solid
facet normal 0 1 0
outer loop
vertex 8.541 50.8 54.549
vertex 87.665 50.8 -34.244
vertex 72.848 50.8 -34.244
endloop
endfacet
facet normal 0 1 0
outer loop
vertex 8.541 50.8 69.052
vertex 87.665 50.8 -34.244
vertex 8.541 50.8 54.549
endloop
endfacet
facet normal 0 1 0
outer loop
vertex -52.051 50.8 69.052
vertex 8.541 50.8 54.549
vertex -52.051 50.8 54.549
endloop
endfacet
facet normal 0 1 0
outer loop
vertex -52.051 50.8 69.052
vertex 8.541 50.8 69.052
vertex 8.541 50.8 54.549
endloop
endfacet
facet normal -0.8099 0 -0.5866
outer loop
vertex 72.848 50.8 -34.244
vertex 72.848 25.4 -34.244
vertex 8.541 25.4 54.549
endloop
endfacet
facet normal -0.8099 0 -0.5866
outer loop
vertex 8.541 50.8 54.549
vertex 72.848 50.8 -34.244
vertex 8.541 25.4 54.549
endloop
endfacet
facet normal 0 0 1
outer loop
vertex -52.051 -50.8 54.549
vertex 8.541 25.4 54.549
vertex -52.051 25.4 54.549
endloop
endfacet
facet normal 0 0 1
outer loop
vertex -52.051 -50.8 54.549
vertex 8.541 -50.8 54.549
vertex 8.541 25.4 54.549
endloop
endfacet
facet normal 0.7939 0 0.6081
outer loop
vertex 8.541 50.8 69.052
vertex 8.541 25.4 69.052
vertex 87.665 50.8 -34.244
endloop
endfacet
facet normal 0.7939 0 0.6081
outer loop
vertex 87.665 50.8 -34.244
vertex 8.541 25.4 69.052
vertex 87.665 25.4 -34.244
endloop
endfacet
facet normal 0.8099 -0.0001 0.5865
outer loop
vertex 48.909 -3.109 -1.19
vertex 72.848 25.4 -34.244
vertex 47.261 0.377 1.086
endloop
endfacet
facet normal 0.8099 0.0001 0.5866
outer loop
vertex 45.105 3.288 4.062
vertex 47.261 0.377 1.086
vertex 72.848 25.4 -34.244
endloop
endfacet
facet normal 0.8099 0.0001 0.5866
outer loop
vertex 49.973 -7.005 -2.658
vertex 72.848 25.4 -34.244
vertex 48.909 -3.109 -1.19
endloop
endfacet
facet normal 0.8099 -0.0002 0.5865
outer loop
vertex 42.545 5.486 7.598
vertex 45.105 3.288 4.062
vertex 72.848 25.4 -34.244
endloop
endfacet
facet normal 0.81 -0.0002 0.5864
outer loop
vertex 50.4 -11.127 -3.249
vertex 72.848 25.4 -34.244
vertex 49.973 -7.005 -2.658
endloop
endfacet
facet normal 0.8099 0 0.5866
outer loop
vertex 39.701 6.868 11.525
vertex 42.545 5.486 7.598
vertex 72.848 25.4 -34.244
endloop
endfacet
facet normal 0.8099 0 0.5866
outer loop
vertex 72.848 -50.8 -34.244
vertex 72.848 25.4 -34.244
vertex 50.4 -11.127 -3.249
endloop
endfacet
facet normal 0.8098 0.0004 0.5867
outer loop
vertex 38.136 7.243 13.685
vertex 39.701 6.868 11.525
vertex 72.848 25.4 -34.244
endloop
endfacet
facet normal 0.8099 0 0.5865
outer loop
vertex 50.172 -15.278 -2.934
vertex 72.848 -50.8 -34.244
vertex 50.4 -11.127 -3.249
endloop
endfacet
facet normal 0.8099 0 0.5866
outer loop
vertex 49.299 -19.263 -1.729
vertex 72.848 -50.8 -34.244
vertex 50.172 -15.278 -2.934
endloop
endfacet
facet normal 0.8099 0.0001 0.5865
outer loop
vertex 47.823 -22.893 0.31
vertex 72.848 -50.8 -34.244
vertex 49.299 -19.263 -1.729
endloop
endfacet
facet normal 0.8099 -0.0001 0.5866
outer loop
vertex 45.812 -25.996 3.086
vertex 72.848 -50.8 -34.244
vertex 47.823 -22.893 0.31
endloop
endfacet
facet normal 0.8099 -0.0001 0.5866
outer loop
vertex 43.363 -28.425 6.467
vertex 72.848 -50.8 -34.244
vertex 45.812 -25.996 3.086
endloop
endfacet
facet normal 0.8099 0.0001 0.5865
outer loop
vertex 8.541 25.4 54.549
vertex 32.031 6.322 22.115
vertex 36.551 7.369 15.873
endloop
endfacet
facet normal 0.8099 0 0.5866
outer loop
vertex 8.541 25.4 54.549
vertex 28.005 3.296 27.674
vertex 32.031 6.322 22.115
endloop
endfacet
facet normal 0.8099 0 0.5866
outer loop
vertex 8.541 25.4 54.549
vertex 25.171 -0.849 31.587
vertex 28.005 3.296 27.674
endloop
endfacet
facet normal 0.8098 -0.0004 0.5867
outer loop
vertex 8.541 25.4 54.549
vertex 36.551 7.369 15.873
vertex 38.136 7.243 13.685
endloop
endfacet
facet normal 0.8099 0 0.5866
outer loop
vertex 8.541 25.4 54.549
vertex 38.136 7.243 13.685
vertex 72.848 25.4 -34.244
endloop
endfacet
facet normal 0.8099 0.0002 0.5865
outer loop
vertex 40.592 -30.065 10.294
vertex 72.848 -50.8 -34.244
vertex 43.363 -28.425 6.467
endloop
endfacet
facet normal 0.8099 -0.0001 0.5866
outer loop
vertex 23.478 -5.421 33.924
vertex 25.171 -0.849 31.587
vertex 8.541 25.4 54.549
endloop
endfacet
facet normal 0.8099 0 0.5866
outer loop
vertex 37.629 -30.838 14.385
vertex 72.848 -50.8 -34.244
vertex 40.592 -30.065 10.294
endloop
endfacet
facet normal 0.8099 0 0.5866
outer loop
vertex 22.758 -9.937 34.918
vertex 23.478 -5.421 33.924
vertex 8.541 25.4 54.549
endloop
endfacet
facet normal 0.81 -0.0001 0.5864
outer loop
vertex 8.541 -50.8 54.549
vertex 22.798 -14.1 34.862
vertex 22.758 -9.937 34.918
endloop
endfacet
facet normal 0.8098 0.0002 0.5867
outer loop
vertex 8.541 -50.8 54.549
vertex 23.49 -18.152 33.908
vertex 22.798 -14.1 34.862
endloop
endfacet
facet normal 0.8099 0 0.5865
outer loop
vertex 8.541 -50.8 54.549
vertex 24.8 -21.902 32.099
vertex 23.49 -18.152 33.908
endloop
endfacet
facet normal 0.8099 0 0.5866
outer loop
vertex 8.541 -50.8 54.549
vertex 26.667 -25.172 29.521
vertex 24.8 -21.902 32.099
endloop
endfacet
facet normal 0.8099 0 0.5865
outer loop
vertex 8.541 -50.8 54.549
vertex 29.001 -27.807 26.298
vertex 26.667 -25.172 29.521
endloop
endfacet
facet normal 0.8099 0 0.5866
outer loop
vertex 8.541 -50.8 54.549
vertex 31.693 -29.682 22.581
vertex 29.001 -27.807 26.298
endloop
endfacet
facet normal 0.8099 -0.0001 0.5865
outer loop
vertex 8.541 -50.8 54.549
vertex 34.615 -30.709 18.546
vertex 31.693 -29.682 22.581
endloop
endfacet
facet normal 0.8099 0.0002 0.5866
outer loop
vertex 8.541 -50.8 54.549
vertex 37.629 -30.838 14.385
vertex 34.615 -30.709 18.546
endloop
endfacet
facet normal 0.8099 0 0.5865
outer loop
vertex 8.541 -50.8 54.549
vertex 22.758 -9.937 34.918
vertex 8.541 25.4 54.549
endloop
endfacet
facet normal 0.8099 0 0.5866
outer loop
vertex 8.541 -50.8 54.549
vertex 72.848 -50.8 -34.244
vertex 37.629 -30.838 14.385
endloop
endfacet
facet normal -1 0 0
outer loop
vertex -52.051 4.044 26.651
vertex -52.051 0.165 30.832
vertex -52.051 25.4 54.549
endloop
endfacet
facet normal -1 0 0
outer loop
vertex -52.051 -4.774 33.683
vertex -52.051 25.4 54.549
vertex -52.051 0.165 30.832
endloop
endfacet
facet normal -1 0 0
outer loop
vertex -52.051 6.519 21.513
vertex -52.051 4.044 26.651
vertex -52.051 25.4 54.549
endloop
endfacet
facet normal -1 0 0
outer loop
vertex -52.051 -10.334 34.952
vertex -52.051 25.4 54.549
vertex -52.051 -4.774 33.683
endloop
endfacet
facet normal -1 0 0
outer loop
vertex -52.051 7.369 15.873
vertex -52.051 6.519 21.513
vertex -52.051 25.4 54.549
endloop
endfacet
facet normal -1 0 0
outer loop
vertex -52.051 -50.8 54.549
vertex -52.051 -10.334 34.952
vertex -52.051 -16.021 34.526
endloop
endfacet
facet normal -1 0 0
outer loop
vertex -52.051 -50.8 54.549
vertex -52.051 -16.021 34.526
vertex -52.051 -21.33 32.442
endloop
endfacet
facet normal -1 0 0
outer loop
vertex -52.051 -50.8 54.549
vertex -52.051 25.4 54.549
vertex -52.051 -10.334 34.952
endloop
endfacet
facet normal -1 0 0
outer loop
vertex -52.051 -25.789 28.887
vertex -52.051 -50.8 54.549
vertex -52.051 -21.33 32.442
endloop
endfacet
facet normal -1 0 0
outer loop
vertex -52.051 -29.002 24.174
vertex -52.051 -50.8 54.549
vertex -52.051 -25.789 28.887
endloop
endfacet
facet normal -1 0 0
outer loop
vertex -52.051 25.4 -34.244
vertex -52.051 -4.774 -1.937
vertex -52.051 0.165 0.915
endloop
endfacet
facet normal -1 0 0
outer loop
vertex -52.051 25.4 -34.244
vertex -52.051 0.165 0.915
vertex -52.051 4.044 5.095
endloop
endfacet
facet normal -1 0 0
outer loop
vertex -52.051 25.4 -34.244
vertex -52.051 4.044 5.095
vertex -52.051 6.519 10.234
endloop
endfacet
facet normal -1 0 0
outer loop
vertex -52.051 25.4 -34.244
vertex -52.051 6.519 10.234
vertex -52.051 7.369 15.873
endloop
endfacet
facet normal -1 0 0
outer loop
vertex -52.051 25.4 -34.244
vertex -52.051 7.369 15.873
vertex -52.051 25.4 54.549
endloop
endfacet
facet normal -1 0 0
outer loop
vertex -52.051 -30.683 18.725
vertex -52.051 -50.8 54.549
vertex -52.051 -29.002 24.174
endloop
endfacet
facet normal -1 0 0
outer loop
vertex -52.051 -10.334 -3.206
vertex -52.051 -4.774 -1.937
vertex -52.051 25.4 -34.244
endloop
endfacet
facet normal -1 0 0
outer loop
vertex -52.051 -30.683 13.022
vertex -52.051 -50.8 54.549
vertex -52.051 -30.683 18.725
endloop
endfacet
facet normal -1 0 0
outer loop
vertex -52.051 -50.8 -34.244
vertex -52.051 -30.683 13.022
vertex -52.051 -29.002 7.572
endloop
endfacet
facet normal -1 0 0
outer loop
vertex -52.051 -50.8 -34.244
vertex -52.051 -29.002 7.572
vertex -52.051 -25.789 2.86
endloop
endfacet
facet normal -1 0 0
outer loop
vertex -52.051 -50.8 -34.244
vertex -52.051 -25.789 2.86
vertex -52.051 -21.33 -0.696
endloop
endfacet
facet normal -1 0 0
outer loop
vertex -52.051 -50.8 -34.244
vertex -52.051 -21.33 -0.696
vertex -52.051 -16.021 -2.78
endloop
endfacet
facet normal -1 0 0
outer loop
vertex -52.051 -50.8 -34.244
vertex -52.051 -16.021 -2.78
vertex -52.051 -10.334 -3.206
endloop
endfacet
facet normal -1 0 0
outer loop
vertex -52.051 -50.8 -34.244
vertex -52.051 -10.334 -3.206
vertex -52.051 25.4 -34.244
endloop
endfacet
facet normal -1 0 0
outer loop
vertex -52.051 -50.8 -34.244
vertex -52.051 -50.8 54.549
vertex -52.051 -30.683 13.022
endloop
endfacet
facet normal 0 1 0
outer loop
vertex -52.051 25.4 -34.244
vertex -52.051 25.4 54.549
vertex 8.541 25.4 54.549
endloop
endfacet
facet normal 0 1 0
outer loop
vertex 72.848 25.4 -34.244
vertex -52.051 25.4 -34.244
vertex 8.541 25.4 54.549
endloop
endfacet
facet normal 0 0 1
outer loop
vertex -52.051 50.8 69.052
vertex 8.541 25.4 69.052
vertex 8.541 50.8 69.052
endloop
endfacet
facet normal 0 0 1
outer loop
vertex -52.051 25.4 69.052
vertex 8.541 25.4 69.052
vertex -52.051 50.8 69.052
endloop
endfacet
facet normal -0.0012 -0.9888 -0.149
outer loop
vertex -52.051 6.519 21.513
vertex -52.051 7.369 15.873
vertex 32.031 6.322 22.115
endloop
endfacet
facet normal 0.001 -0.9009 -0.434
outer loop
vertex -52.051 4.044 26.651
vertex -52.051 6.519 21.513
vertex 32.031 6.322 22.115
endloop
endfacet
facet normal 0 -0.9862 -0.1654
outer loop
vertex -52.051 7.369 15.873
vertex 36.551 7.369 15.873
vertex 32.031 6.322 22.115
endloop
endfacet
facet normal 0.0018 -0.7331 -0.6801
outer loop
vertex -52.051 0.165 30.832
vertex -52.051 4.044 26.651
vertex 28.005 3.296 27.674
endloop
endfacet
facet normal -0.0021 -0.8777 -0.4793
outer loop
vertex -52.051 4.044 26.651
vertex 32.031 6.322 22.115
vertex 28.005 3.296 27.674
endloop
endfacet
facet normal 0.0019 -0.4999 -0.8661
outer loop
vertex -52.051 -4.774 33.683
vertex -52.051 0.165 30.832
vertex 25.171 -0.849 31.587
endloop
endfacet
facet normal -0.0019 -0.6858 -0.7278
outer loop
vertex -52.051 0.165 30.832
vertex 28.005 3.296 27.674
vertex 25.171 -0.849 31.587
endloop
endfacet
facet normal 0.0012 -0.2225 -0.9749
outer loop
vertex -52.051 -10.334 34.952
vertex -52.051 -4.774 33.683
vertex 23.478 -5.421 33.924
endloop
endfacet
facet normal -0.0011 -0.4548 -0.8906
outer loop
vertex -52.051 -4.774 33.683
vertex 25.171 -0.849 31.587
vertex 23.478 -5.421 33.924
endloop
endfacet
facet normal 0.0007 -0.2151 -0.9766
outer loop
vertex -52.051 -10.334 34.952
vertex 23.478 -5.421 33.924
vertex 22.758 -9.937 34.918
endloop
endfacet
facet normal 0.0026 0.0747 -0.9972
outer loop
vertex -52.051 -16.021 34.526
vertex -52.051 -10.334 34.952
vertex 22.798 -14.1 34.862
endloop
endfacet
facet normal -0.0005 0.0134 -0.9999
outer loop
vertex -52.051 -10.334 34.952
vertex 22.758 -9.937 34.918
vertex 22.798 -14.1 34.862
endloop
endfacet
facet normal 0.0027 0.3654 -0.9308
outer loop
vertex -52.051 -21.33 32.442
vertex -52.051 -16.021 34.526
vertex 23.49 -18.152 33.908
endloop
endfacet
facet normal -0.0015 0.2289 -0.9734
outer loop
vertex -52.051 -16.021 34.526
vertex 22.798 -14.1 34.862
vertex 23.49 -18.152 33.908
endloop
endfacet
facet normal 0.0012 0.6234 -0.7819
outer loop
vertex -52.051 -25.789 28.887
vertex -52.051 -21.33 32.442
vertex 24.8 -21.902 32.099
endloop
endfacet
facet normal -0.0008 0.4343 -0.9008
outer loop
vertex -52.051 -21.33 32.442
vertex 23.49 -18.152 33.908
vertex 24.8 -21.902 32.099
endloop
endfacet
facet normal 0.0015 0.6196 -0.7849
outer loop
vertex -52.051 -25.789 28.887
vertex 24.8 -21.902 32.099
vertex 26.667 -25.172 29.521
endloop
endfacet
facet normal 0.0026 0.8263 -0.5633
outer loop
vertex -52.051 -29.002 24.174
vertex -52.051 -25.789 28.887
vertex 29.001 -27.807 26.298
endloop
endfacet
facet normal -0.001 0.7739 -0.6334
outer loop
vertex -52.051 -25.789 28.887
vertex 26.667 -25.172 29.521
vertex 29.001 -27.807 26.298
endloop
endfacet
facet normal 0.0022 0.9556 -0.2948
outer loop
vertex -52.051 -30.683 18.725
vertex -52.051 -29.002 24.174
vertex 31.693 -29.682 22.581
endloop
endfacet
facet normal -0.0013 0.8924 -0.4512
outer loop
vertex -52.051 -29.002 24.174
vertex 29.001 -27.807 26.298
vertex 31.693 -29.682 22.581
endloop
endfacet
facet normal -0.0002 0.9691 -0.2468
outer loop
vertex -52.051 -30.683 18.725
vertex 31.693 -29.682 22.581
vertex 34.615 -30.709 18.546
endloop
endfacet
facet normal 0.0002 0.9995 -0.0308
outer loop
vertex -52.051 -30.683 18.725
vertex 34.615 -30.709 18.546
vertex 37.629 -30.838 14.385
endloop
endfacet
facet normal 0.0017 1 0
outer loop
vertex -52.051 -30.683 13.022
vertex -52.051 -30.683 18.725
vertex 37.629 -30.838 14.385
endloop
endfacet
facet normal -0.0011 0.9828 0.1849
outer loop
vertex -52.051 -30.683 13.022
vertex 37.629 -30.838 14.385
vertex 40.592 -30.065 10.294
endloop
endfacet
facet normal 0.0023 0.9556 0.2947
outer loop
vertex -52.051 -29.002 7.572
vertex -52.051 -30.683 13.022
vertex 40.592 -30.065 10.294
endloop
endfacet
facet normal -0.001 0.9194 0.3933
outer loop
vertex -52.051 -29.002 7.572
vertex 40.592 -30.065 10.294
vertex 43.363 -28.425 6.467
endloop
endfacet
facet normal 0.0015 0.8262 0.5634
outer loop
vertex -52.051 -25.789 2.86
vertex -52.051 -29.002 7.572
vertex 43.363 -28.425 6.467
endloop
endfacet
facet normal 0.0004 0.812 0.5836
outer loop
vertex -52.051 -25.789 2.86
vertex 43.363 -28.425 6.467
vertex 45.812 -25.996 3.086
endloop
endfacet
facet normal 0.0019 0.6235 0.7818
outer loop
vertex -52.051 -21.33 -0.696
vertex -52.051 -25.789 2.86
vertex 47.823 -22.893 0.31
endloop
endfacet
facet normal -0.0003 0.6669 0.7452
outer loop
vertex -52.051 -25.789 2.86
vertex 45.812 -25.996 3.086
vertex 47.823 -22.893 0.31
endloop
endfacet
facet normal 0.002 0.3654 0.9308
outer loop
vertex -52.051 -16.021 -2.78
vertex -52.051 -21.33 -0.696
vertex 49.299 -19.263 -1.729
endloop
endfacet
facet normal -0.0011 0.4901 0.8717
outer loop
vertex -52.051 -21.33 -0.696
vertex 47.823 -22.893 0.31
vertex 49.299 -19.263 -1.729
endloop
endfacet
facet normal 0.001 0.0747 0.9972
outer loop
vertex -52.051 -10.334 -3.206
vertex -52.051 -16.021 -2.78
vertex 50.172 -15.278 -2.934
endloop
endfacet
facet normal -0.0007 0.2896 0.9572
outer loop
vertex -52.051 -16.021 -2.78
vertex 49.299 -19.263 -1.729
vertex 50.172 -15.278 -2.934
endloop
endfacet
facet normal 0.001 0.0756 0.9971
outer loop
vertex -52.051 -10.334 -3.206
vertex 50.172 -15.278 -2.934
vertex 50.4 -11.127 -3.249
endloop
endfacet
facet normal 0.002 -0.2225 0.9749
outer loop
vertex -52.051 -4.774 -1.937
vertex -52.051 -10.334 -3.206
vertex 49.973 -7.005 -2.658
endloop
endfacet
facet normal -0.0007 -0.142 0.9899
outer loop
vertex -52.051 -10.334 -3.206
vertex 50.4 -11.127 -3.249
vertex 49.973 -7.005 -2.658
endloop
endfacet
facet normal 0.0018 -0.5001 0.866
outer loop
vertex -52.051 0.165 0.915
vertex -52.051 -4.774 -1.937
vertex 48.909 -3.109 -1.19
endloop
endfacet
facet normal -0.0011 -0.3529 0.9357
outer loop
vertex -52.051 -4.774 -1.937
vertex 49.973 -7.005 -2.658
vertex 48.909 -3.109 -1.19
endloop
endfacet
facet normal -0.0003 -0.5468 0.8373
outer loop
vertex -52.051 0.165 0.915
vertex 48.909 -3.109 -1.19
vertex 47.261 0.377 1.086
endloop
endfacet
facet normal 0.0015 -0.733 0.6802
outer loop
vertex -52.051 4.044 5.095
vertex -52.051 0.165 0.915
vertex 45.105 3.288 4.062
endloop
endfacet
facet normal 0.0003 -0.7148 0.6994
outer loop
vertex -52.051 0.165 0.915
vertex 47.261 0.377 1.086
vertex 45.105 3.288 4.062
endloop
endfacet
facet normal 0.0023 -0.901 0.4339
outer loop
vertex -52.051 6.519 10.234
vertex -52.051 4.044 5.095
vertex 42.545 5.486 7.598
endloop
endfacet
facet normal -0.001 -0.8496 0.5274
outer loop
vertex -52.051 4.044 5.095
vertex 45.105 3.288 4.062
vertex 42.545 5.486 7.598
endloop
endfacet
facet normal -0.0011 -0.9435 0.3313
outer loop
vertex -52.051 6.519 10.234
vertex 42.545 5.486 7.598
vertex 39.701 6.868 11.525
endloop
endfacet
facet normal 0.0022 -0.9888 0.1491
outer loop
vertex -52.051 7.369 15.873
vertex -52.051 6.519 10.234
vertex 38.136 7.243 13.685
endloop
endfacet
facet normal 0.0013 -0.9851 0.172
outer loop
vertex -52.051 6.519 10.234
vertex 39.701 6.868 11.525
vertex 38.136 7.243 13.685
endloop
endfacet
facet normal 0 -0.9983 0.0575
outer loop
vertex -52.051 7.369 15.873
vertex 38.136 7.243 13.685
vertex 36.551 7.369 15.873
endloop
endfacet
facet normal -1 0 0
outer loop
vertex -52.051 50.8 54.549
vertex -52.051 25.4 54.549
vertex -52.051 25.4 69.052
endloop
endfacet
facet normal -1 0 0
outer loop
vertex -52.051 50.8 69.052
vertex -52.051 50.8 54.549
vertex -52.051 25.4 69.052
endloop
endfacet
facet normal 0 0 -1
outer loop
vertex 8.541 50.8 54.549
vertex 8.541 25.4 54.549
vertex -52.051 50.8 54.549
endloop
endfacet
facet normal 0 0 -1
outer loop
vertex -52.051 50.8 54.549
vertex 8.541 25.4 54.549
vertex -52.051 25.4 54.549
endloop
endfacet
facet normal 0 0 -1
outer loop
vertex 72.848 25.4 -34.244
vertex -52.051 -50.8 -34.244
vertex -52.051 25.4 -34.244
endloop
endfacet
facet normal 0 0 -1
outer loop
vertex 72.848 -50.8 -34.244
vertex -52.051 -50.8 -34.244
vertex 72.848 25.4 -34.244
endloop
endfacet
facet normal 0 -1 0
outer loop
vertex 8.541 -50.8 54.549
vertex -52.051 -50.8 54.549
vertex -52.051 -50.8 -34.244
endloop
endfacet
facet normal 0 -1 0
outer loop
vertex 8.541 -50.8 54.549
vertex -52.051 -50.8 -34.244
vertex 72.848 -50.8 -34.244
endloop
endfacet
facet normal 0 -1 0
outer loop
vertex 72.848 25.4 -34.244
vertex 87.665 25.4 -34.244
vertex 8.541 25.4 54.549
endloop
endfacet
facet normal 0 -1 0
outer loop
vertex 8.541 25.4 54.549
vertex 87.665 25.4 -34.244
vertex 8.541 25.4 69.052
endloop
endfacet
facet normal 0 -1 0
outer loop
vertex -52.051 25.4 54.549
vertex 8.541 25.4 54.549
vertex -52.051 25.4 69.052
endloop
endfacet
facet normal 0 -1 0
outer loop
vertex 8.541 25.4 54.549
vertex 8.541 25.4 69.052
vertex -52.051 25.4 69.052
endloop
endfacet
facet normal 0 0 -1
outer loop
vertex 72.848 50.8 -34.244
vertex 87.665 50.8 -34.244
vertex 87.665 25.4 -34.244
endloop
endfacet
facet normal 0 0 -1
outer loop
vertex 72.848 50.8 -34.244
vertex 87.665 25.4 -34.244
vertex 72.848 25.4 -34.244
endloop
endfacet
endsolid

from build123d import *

# Parameters (mm, degrees)
F1_DEPTH      = 50.8
F1_DEPTH_BACK = 25.4
F2_W          = 60.5916632339
F2_H          = 14.503326267
F3_DEPTH      = 25.4
F4_R          = 19.1325544218
F5_DEPTH      = 90.678
F5_DEPTH_BACK = 117.602


with BuildPart() as f1:
    # F0 (on Front) → F1 (new body, two sides)
    with BuildSketch(Plane.XZ) as f1_sk:
        Polygon((-52.0508177578, 54.5486100018), (-52.0508177578, -34.2439599335), (8.5408454761, -34.2439599335), (72.8483721614, -34.2439599335), (8.5408454761, 54.5486100018), align=None)
    extrude(amount=F1_DEPTH)
    extrude(f1_sk.sketch, amount=-F1_DEPTH_BACK)

    # F4 (on Right) → F5 (cut, two sides)
    with BuildSketch(Plane.YZ) as f5_sk:
        with Locations((-11.7638064548, 15.8730819821)):
            Circle(F4_R)
    extrude(amount=F5_DEPTH, mode=Mode.SUBTRACT)
    extrude(f5_sk.sketch, amount=-F5_DEPTH_BACK, mode=Mode.SUBTRACT)


with BuildPart() as f3:
    # F2 (on face) → F3 (new body)
    with BuildSketch(Plane(origin=(0, 25.4, 0), x_dir=(-1, 0, 0), z_dir=(0, 1, 0))):
        with Locations((21.7549861409, 61.8002731353)):
            Rectangle(F2_W, F2_H)
        Polygon((-72.8483721614, -34.2439599335), (-8.5408454761, 54.5486100018), (-8.5408454761, 69.0519362688), (-87.6645371318, -34.2439599335), align=None)
    extrude(amount=F3_DEPTH)


solid = Compound([f1.part, f3.part])
